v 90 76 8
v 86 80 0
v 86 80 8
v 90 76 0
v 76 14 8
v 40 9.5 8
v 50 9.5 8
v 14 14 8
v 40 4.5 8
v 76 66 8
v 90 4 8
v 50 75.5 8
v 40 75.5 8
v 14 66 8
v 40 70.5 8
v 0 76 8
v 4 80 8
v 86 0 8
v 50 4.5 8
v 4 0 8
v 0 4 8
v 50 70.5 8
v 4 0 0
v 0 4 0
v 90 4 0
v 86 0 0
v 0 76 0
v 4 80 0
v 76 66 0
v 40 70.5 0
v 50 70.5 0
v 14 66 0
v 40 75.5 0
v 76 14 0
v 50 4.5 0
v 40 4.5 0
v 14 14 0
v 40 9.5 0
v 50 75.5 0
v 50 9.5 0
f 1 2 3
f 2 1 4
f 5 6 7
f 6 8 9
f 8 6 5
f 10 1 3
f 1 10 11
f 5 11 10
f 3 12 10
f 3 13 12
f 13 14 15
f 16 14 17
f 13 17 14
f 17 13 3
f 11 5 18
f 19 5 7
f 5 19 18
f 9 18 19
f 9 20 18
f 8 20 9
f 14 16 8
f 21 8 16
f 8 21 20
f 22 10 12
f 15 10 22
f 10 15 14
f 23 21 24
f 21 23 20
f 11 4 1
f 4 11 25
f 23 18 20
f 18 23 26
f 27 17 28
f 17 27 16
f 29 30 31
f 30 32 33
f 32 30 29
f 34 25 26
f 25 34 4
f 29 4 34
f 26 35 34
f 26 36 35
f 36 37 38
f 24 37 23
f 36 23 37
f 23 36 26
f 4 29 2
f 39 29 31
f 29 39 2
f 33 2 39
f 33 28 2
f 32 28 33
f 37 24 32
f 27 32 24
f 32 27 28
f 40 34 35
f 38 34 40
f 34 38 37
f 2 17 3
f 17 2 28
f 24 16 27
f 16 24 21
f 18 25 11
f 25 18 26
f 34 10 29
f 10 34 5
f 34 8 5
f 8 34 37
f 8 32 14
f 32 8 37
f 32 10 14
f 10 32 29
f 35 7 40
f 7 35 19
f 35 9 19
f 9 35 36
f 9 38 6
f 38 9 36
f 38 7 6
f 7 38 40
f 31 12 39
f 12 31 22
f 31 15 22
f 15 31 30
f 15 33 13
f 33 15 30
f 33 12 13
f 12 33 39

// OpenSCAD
$fn = 32;

// ----------------------------------------------------------------------
// Frame plate: 90 x 80 frame, 14 mm rails
// ----------------------------------------------------------------------

// --- parameters (mm) ---
plate_l = 90;             // plate length, X
plate_w = 80;             // plate width, Y
plate_t = 8;              // plate thickness, Z (extrusion height)
corner_c = 4;             // corner chamfer
frame_bar = 14;           // frame rail width
slot_l = 10;              // adjustment slot length
slot_w = 5;               // adjustment slot width

win_l = plate_l - 2 * frame_bar;  // window length
win_w = plate_w - 2 * frame_bar;  // window width

profile = [[4, 0], [86, 0], [90, 4], [90, 76], [86, 80], [4, 80], [0, 76], [0, 4]];  // primary outline, 8 points, counter clockwise
void_1 = [[14, 14], [76, 14], [76, 66], [14, 66]];  // the window, 4 points
void_2 = [[40, 4.5], [50, 4.5], [50, 9.5], [40, 9.5]];  // adjustment slot, 4 points
void_3 = [[40, 70.5], [50, 70.5], [50, 75.5], [40, 75.5]];  // adjustment slot, 4 points

// --- the one profile operation ---
difference() {
  linear_extrude(height = plate_t) polygon(points = profile);
  translate([0, 0, -1])
    linear_extrude(height = plate_t + 2) polygon(points = void_1);
  translate([0, 0, -1])
    linear_extrude(height = plate_t + 2) polygon(points = void_2);
  translate([0, 0, -1])
    linear_extrude(height = plate_t + 2) polygon(points = void_3);
}
